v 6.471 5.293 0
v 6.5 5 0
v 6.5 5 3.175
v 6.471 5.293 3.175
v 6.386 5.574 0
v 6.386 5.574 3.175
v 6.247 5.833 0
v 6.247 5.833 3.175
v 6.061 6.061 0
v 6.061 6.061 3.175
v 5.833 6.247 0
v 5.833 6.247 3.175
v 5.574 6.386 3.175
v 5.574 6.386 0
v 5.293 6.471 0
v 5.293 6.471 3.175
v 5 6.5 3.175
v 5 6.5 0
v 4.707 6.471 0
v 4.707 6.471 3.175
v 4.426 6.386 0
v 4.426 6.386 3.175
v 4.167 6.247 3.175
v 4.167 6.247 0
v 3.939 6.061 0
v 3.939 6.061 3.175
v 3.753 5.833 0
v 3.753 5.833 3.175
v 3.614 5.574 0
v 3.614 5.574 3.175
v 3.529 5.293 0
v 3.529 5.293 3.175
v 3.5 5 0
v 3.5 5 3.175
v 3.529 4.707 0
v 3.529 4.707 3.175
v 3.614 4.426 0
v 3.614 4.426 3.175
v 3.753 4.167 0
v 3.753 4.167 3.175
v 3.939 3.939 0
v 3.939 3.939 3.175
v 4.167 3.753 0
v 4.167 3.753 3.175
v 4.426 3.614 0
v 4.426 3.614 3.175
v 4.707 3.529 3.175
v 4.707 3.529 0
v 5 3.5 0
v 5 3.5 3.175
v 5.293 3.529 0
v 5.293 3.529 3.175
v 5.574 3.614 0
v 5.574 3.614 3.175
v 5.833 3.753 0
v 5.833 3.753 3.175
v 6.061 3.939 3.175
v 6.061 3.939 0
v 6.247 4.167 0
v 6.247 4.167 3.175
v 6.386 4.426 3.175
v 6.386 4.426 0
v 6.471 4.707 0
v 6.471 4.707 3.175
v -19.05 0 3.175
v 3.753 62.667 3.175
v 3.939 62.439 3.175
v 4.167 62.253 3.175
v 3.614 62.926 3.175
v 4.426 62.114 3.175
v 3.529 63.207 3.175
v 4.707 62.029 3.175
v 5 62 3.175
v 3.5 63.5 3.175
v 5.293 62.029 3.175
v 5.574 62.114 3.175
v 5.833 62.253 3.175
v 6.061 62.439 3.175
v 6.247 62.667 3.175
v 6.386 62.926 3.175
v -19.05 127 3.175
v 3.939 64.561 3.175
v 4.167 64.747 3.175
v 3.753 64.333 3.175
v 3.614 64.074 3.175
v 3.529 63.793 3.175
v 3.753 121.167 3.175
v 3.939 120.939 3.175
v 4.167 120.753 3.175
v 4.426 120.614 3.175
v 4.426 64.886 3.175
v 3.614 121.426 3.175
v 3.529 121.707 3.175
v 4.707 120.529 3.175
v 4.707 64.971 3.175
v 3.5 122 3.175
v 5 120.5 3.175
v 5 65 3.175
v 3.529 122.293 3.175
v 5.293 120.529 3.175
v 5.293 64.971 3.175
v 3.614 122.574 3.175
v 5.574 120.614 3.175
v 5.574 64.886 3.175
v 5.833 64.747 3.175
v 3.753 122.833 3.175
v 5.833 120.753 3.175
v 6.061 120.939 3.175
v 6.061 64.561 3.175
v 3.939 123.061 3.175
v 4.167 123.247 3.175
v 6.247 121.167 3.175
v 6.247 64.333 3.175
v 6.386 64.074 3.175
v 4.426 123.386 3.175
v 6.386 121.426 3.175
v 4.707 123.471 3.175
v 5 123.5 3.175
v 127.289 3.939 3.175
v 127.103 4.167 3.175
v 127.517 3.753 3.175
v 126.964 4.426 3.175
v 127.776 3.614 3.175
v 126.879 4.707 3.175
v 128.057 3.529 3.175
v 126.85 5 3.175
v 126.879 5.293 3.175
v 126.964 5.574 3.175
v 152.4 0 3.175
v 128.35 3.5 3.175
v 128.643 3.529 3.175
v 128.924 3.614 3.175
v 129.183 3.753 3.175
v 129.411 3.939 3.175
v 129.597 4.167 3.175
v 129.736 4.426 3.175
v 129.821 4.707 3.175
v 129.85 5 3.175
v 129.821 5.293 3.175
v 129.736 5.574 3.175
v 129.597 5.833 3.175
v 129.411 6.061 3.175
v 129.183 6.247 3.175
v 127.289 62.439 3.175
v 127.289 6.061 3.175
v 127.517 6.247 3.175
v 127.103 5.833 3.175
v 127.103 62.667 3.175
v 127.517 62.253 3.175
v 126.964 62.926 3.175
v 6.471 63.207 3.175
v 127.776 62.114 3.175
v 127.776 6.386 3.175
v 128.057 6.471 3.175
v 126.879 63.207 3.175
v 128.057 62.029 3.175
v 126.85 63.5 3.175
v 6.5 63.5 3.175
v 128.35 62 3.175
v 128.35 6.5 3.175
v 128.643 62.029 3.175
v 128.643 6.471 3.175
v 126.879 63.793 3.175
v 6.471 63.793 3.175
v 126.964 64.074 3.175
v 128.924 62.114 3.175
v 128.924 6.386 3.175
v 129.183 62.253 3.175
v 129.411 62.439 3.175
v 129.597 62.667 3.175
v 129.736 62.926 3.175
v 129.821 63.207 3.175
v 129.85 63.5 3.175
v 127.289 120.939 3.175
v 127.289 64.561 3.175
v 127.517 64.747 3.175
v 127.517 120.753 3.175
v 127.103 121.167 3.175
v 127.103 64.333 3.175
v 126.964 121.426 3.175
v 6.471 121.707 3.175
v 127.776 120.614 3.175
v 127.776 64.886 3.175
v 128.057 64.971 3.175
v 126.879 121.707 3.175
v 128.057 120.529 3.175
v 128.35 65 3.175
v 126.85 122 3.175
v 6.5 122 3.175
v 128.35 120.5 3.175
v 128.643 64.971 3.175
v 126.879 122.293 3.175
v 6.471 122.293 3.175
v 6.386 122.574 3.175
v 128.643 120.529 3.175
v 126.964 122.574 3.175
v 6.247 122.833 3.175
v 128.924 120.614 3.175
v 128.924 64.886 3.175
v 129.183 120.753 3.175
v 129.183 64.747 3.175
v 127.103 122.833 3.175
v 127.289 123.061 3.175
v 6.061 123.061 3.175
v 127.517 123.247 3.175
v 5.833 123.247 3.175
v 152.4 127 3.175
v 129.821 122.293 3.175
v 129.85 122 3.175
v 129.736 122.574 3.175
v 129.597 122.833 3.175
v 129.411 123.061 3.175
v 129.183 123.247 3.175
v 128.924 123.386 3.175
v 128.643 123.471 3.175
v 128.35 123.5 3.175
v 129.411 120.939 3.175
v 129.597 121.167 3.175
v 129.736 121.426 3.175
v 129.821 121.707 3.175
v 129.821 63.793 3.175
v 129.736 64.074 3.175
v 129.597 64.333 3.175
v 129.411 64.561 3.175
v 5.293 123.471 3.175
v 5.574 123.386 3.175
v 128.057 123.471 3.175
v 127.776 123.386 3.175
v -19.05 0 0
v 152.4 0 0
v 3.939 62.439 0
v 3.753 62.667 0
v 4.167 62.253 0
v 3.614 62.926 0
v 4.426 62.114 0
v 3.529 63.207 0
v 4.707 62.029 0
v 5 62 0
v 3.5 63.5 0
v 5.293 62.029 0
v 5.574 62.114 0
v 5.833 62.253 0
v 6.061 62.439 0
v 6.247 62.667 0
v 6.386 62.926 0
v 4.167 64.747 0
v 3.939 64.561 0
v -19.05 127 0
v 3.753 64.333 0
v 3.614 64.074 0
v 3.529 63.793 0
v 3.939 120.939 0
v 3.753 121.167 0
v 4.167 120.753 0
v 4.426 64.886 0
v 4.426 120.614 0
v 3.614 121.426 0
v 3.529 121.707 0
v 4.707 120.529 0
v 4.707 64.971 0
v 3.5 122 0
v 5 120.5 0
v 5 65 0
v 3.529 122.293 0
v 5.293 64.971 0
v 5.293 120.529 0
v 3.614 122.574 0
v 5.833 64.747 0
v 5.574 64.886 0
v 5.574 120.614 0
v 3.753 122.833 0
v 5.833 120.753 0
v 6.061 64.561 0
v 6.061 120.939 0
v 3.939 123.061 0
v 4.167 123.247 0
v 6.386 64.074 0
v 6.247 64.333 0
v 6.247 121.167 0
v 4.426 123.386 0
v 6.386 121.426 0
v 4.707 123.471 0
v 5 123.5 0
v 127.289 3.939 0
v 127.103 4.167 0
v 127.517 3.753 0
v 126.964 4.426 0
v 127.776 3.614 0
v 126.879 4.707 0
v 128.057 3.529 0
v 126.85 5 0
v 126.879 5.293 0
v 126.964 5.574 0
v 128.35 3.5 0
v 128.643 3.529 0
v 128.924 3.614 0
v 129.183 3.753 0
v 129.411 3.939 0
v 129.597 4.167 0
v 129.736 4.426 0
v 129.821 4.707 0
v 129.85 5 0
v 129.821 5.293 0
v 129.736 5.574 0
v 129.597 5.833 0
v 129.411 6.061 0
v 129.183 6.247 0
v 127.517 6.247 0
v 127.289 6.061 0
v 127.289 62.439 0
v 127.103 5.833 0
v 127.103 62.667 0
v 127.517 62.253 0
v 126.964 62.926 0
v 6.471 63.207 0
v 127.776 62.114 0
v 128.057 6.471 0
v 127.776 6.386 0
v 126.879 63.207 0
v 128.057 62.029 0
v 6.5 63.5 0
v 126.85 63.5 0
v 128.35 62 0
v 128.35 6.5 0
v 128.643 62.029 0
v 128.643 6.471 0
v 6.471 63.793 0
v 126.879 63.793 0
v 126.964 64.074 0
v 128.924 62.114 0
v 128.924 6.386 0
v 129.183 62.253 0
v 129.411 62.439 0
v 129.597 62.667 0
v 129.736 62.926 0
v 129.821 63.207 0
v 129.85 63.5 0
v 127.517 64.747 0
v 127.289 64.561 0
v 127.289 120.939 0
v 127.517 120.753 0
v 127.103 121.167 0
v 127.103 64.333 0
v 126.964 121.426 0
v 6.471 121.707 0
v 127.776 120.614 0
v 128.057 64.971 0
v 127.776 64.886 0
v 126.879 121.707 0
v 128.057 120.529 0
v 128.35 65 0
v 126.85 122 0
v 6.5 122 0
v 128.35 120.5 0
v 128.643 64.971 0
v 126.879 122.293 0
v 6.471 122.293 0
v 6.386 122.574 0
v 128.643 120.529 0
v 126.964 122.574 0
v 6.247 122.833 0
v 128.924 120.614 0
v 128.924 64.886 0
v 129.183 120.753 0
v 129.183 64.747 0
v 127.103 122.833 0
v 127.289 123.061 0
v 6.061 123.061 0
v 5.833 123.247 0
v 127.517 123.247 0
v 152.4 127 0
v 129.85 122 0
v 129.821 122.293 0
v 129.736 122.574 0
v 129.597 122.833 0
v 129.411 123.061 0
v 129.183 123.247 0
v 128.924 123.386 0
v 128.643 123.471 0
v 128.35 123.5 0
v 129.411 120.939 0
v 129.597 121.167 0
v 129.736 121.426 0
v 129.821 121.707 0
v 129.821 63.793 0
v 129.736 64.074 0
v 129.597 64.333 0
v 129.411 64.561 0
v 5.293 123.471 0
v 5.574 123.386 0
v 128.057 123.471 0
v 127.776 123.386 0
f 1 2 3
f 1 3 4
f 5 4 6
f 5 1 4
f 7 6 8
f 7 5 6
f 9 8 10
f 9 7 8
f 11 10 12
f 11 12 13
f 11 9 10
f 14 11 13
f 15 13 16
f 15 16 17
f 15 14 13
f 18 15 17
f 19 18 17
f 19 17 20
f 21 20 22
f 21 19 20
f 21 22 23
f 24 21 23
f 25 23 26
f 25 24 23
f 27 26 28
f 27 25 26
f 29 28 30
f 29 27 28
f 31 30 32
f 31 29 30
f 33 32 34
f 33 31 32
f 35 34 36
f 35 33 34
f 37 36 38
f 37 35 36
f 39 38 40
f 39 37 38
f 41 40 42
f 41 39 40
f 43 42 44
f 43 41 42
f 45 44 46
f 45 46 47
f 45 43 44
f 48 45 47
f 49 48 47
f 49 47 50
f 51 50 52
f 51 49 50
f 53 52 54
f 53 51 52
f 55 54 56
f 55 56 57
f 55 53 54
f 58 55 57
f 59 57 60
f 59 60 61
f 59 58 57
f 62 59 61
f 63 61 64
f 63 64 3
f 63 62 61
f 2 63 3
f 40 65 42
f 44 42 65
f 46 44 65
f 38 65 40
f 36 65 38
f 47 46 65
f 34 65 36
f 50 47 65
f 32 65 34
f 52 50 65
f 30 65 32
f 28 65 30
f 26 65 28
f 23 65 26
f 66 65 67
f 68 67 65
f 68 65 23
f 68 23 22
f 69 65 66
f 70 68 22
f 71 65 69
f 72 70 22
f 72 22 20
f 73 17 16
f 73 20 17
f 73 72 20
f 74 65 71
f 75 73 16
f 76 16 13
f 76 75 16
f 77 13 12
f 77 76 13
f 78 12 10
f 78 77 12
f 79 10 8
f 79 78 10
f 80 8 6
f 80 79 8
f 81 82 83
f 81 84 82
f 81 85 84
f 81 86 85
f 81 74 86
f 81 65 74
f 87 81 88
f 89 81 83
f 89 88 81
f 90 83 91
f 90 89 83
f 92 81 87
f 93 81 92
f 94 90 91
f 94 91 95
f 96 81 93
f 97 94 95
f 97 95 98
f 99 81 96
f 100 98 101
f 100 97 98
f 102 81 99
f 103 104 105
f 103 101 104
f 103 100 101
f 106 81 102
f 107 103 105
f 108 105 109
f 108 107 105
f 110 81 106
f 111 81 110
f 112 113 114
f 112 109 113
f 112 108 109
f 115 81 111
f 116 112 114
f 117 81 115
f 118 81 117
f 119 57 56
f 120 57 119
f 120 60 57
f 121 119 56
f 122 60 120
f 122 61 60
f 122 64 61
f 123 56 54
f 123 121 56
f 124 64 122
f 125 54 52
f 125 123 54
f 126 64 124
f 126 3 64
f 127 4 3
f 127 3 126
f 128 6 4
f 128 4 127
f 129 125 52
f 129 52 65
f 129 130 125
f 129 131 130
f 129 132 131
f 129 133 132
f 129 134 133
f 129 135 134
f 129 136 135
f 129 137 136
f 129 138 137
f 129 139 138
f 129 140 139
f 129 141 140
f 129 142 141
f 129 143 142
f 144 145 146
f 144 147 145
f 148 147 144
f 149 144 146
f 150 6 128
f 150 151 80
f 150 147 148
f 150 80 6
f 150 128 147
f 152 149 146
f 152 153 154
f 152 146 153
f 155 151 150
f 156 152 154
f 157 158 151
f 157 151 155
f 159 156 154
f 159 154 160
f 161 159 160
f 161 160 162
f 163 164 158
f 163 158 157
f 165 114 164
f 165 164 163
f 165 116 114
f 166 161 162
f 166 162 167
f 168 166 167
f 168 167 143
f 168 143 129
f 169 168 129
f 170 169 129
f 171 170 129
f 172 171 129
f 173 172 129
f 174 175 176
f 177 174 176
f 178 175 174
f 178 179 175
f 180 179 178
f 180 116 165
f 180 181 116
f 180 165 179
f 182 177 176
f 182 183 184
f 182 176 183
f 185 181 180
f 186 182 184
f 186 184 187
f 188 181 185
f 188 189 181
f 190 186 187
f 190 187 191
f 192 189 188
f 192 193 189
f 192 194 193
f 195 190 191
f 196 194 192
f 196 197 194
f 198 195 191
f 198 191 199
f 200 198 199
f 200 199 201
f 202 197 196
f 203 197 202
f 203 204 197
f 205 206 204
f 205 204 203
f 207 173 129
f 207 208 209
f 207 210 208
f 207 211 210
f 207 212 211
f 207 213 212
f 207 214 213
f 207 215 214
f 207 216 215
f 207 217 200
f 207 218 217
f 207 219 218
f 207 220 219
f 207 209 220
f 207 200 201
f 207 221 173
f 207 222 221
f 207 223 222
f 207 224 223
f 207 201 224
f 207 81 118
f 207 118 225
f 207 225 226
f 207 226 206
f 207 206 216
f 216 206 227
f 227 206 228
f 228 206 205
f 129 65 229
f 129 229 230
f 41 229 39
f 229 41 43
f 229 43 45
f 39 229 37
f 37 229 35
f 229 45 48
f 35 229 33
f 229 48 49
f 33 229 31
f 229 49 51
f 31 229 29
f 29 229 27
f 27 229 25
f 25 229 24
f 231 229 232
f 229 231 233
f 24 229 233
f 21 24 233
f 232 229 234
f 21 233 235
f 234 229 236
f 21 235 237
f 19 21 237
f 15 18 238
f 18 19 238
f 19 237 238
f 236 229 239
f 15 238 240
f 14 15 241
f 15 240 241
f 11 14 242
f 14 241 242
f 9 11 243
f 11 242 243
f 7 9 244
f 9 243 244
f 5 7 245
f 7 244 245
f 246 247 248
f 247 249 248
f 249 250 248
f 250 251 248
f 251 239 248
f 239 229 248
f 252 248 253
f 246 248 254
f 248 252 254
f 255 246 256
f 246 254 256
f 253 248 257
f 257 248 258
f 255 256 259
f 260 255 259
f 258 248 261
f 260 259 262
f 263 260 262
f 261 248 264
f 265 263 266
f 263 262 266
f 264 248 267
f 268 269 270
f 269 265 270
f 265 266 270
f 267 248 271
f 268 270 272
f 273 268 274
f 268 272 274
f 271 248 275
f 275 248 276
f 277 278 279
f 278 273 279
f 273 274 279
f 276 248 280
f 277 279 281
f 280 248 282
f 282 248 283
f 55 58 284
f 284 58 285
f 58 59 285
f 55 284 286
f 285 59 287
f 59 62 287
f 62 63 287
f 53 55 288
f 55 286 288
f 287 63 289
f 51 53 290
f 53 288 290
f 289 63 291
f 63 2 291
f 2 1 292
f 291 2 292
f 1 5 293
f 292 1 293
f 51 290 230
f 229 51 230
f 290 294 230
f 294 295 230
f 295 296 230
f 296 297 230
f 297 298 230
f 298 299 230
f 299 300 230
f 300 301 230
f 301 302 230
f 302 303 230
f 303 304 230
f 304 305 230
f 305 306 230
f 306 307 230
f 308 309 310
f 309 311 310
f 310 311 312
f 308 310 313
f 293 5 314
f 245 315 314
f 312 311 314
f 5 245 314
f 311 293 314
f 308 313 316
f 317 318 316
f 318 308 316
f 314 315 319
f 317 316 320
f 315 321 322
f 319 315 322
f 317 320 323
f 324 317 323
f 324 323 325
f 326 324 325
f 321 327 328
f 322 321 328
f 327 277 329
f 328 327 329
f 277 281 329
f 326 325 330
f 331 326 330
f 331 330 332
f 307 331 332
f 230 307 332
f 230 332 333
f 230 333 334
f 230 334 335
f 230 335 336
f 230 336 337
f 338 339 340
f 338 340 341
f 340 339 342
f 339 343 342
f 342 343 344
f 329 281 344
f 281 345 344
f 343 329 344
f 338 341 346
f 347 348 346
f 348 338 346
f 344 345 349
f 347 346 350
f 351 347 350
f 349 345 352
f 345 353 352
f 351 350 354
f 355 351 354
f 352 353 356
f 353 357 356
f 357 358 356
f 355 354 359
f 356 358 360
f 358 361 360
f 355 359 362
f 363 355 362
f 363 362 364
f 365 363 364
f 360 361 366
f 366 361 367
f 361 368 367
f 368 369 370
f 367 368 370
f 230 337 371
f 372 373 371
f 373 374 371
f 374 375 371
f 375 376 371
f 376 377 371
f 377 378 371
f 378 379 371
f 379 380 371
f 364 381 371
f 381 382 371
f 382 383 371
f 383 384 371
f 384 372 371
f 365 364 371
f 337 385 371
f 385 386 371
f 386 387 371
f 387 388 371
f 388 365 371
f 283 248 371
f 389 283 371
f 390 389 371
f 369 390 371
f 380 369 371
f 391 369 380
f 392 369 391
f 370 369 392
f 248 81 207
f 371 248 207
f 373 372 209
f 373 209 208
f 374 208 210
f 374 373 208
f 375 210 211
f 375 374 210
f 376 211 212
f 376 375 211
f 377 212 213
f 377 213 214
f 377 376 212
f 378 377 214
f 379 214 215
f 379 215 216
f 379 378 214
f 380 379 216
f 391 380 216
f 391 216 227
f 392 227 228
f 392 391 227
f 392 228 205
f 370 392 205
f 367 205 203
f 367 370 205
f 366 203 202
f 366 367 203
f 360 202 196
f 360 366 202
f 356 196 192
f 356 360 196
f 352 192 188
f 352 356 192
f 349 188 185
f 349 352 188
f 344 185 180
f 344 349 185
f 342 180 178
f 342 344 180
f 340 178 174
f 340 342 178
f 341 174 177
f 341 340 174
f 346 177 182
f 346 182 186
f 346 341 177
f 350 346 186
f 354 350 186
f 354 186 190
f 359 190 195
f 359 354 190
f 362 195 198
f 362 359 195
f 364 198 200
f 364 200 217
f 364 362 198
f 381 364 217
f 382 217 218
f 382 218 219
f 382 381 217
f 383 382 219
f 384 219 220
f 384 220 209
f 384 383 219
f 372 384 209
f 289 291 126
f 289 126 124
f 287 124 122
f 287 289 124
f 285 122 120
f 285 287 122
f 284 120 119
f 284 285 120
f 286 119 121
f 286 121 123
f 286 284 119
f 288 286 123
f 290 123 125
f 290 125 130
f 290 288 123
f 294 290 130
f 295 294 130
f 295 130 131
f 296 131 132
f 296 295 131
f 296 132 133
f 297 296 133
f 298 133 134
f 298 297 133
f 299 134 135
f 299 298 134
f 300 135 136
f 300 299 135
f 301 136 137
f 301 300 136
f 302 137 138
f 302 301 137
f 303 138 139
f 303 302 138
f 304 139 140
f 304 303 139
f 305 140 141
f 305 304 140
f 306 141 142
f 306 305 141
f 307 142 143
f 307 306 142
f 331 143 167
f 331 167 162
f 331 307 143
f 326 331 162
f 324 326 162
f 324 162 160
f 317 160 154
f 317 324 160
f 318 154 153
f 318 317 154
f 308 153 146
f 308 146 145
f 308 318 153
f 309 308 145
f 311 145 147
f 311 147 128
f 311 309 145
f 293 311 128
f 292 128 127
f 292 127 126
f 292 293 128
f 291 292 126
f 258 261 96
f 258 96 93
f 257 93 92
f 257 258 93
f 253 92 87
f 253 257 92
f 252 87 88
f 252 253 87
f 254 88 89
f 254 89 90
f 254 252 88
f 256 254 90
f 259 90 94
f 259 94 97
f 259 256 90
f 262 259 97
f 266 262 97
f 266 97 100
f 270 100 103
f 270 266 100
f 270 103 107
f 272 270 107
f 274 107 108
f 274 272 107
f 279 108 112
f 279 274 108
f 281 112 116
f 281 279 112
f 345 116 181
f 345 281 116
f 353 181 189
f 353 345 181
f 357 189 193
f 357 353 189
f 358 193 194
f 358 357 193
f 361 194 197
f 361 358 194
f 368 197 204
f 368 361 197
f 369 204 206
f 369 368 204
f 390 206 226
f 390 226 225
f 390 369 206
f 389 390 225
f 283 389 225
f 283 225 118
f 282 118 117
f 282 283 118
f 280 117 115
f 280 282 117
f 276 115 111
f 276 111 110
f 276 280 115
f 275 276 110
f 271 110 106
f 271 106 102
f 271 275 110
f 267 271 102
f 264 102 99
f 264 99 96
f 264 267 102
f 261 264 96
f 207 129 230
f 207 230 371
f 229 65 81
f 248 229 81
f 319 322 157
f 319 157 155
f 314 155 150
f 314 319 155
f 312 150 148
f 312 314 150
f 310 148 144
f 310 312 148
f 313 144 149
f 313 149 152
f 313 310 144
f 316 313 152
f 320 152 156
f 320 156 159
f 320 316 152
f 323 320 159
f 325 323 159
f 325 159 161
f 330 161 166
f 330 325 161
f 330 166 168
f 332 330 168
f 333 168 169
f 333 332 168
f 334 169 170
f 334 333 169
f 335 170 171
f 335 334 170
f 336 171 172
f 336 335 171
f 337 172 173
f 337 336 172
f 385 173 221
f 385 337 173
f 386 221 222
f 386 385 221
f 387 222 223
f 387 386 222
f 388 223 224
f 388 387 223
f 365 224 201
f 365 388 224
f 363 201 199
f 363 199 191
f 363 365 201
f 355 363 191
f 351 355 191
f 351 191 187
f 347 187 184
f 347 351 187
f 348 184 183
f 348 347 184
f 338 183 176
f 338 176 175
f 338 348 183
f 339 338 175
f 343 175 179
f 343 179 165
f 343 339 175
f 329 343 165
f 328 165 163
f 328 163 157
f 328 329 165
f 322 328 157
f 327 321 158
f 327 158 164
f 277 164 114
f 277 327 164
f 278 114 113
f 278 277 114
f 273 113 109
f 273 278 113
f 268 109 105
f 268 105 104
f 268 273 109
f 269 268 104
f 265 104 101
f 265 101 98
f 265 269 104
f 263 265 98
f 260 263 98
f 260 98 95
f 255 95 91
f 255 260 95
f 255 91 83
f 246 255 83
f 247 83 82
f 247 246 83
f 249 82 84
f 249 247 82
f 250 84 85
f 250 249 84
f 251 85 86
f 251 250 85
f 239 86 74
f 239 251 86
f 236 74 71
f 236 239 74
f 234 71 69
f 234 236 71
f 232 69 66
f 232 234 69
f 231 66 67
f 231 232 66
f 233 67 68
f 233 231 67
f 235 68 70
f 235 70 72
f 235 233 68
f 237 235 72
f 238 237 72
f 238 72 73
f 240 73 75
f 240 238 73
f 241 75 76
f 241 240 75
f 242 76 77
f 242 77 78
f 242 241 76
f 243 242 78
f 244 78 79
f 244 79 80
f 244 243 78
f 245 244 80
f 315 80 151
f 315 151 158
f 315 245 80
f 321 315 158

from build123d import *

# Parameters (mm, degrees)
SKETCH1_W           = 133.35
SKETCH1_H           = 127
SKETCH1_R           = 1.5
BOSS_EXTRUDE1_DEPTH = 3.175
SKETCH3_W           = 19.05
SKETCH3_H           = 127
BOSS_EXTRUDE2_DEPTH = 3.175


with BuildPart() as part:
    # Sketch1 → Boss-Extrude1 (new body)
    with BuildSketch(Plane.XY):
        with Locations((66.675, 63.5)):
            Rectangle(SKETCH1_W, SKETCH1_H)
        with Locations((5, 5)):
            Circle(SKETCH1_R, mode=Mode.SUBTRACT)
        with Locations(Location((5, 122, 0), (0, 0, 180))):
            Circle(SKETCH1_R, mode=Mode.SUBTRACT)
        with Locations((5, 63.5)):
            Circle(SKETCH1_R, mode=Mode.SUBTRACT)
        with Locations((128.35, 122)):
            Circle(SKETCH1_R, mode=Mode.SUBTRACT)
        with Locations(Location((128.35, 63.5, 0), (0, 0, 180))):
            Circle(SKETCH1_R, mode=Mode.SUBTRACT)
        with Locations(Location((128.35, 5, 0), (0, 0, 180))):
            Circle(SKETCH1_R, mode=Mode.SUBTRACT)
    extrude(amount=BOSS_EXTRUDE1_DEPTH)

    # Sketch3 → Boss-Extrude2 (add)
    with BuildSketch(Plane.XY.offset(3.175)):
        with Locations((-9.525, 63.5)):
            Rectangle(SKETCH3_W, SKETCH3_H)
        with Locations((142.875, 63.5)):
            Rectangle(SKETCH3_W, SKETCH3_H)
    extrude(amount=-BOSS_EXTRUDE2_DEPTH)


solid = part.part
